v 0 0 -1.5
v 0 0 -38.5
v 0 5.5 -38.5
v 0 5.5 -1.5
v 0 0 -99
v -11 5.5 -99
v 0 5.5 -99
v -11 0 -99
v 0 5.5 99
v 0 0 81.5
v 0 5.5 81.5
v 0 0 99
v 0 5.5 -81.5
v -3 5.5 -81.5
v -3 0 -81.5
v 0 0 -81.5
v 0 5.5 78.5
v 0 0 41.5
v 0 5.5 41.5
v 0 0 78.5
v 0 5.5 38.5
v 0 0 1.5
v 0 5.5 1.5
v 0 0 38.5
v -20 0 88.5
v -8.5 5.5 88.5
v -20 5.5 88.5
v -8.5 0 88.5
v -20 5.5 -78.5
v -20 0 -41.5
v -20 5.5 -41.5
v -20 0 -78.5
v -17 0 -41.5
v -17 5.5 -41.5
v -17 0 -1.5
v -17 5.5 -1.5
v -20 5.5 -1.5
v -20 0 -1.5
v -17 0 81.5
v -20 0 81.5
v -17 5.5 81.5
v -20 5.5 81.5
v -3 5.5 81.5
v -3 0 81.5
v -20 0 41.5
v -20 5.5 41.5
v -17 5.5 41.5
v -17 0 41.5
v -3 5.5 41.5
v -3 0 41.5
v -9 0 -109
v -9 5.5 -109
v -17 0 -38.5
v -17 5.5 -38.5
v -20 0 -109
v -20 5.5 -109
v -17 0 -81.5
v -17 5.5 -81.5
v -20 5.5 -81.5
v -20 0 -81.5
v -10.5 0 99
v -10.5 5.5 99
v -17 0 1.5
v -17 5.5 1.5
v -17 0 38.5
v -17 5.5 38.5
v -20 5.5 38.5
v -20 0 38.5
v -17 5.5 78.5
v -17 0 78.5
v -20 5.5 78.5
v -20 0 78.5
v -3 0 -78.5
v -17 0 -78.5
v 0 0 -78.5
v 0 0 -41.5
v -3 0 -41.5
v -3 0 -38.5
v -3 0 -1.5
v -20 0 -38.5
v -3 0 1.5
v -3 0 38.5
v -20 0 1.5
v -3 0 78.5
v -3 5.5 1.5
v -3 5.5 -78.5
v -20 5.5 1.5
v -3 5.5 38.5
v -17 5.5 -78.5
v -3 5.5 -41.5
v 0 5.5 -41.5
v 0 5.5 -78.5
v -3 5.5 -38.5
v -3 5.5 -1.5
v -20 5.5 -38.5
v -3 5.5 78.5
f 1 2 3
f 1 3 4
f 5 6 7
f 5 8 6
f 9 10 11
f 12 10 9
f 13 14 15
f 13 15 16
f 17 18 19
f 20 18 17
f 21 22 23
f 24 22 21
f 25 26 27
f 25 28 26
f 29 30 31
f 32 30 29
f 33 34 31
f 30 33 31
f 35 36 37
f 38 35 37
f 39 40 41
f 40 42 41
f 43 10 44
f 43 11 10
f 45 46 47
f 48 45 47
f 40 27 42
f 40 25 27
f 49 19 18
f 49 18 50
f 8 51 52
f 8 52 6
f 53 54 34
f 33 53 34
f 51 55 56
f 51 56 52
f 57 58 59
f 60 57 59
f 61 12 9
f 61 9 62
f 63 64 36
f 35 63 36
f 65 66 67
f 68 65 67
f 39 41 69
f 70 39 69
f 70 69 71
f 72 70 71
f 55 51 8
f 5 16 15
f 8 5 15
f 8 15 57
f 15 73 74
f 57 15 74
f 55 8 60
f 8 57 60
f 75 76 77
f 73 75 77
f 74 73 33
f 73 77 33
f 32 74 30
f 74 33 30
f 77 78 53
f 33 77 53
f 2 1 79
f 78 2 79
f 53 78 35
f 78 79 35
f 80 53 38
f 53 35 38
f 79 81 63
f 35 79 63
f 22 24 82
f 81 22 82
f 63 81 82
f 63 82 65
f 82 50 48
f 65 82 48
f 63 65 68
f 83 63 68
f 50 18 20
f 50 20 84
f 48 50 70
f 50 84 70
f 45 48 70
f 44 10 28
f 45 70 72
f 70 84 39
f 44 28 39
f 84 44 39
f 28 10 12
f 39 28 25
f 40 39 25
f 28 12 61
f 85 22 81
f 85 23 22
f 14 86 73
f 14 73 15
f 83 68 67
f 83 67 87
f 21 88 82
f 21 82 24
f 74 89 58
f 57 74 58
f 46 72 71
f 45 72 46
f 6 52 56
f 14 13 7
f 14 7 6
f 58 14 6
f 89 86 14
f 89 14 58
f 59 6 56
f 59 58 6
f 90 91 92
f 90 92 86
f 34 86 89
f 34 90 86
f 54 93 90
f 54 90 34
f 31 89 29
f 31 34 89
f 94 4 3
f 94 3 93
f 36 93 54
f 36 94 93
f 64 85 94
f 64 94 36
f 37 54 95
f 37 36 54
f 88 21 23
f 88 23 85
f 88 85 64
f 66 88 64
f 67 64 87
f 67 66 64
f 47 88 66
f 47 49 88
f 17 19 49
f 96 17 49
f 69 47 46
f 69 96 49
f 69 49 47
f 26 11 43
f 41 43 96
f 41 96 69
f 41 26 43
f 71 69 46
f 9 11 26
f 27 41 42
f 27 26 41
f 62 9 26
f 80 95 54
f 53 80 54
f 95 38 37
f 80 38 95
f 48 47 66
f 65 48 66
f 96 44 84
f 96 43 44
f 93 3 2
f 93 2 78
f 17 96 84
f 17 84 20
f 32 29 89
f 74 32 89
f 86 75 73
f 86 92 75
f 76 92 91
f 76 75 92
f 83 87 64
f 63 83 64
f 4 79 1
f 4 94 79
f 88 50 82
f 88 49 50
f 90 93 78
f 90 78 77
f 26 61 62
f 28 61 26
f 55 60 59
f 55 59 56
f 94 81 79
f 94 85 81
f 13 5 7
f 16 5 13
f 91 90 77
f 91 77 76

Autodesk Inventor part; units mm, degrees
ref_plane "YZ Plane" through (0, 0, 0) normal (1, 0, 0) x (0, 1, 0)
ref_plane "XZ Plane" through (0, 0, 0) normal (0, 1, 0) x (-1, 0, 0)
ref_plane "XY Plane" through (0, 0, 0) normal (0, 0, 1) x (1, 0, 0)
sketch "スケッチ1" plane through (0, 0, 0) normal (0, 1, 0) x (-1, 0, 0)
  line L0 (0, 99) -> (20, 99)
  line L1 (20, 99) -> (20, -99)
  line L2 (20, -99) -> (0, -99)
  line L3 (0, -99) -> (0, 99)
  line L4 (20, -99) -> (20, -109)
  line L5 (20, -109) -> (9, -109)
  line L6 (9, -109) -> (11, -99)
  line L7 (10.5, 99) -> (8.5, 88.5)
  line L8 (8.5, 88.5) -> (20, 88.5)
  point P0 (0, 0)
  point P1 (0, 0)
  point P2 (10, -99)
  point P3 (10, 99)
  dimension "d0" = 198
  dimension "d1" = 20
  dimension "d4" = 10
  dimension "d5" = 1
  dimension "d6" = 1
  dimension "d7" = 10.5
  dimension "d8" = 1.5
  dimension "d9" = 0.5
extrude "押し出し1" add sketch "スケッチ1" along normal blind 5.5 contours L0 L7 L8 L1 L2 L3 | L2 L4 L5 L6
sketch "スケッチ2" plane through (0, 5.5, 0) normal (0, 1, 0) x (1, 0, 0)
  line L0 (-20, 109) -> (-20, -88.5) projected
  line L1 (-20, -1.5) -> (-17, -1.5)
  line L2 (-17, -1.5) -> (-17, 1.5)
  line L3 (-17, 1.5) -> (-20, 1.5)
  line L4 (-20, 1.5) -> (-20, -1.5)
  line L5 (0, -99) -> (0, 99) projected
  line L6 (0, -1.5) -> (-3, -1.5)
  line L7 (-3, -1.5) -> (-3, 1.5)
  line L8 (-3, 1.5) -> (0, 1.5)
  line L9 (0, 1.5) -> (0, -1.5)
  point P0 (0, 0)
  point P1 (-17, 0)
  point P2 (0, 0)
  point P3 (0, 1.5)
  dimension "d10" = 3
  dimension "d11" = 3
extrude "押し出し2" cut sketch "スケッチ2" against normal through all
pattern_linear "矩形状パターン1" count 3 spacing 40 along (0, 0, -1) count 3 spacing 40 along (0, 0, 1) of "押し出し2"
properties part number "front" material "木材 (カエデ材)"
